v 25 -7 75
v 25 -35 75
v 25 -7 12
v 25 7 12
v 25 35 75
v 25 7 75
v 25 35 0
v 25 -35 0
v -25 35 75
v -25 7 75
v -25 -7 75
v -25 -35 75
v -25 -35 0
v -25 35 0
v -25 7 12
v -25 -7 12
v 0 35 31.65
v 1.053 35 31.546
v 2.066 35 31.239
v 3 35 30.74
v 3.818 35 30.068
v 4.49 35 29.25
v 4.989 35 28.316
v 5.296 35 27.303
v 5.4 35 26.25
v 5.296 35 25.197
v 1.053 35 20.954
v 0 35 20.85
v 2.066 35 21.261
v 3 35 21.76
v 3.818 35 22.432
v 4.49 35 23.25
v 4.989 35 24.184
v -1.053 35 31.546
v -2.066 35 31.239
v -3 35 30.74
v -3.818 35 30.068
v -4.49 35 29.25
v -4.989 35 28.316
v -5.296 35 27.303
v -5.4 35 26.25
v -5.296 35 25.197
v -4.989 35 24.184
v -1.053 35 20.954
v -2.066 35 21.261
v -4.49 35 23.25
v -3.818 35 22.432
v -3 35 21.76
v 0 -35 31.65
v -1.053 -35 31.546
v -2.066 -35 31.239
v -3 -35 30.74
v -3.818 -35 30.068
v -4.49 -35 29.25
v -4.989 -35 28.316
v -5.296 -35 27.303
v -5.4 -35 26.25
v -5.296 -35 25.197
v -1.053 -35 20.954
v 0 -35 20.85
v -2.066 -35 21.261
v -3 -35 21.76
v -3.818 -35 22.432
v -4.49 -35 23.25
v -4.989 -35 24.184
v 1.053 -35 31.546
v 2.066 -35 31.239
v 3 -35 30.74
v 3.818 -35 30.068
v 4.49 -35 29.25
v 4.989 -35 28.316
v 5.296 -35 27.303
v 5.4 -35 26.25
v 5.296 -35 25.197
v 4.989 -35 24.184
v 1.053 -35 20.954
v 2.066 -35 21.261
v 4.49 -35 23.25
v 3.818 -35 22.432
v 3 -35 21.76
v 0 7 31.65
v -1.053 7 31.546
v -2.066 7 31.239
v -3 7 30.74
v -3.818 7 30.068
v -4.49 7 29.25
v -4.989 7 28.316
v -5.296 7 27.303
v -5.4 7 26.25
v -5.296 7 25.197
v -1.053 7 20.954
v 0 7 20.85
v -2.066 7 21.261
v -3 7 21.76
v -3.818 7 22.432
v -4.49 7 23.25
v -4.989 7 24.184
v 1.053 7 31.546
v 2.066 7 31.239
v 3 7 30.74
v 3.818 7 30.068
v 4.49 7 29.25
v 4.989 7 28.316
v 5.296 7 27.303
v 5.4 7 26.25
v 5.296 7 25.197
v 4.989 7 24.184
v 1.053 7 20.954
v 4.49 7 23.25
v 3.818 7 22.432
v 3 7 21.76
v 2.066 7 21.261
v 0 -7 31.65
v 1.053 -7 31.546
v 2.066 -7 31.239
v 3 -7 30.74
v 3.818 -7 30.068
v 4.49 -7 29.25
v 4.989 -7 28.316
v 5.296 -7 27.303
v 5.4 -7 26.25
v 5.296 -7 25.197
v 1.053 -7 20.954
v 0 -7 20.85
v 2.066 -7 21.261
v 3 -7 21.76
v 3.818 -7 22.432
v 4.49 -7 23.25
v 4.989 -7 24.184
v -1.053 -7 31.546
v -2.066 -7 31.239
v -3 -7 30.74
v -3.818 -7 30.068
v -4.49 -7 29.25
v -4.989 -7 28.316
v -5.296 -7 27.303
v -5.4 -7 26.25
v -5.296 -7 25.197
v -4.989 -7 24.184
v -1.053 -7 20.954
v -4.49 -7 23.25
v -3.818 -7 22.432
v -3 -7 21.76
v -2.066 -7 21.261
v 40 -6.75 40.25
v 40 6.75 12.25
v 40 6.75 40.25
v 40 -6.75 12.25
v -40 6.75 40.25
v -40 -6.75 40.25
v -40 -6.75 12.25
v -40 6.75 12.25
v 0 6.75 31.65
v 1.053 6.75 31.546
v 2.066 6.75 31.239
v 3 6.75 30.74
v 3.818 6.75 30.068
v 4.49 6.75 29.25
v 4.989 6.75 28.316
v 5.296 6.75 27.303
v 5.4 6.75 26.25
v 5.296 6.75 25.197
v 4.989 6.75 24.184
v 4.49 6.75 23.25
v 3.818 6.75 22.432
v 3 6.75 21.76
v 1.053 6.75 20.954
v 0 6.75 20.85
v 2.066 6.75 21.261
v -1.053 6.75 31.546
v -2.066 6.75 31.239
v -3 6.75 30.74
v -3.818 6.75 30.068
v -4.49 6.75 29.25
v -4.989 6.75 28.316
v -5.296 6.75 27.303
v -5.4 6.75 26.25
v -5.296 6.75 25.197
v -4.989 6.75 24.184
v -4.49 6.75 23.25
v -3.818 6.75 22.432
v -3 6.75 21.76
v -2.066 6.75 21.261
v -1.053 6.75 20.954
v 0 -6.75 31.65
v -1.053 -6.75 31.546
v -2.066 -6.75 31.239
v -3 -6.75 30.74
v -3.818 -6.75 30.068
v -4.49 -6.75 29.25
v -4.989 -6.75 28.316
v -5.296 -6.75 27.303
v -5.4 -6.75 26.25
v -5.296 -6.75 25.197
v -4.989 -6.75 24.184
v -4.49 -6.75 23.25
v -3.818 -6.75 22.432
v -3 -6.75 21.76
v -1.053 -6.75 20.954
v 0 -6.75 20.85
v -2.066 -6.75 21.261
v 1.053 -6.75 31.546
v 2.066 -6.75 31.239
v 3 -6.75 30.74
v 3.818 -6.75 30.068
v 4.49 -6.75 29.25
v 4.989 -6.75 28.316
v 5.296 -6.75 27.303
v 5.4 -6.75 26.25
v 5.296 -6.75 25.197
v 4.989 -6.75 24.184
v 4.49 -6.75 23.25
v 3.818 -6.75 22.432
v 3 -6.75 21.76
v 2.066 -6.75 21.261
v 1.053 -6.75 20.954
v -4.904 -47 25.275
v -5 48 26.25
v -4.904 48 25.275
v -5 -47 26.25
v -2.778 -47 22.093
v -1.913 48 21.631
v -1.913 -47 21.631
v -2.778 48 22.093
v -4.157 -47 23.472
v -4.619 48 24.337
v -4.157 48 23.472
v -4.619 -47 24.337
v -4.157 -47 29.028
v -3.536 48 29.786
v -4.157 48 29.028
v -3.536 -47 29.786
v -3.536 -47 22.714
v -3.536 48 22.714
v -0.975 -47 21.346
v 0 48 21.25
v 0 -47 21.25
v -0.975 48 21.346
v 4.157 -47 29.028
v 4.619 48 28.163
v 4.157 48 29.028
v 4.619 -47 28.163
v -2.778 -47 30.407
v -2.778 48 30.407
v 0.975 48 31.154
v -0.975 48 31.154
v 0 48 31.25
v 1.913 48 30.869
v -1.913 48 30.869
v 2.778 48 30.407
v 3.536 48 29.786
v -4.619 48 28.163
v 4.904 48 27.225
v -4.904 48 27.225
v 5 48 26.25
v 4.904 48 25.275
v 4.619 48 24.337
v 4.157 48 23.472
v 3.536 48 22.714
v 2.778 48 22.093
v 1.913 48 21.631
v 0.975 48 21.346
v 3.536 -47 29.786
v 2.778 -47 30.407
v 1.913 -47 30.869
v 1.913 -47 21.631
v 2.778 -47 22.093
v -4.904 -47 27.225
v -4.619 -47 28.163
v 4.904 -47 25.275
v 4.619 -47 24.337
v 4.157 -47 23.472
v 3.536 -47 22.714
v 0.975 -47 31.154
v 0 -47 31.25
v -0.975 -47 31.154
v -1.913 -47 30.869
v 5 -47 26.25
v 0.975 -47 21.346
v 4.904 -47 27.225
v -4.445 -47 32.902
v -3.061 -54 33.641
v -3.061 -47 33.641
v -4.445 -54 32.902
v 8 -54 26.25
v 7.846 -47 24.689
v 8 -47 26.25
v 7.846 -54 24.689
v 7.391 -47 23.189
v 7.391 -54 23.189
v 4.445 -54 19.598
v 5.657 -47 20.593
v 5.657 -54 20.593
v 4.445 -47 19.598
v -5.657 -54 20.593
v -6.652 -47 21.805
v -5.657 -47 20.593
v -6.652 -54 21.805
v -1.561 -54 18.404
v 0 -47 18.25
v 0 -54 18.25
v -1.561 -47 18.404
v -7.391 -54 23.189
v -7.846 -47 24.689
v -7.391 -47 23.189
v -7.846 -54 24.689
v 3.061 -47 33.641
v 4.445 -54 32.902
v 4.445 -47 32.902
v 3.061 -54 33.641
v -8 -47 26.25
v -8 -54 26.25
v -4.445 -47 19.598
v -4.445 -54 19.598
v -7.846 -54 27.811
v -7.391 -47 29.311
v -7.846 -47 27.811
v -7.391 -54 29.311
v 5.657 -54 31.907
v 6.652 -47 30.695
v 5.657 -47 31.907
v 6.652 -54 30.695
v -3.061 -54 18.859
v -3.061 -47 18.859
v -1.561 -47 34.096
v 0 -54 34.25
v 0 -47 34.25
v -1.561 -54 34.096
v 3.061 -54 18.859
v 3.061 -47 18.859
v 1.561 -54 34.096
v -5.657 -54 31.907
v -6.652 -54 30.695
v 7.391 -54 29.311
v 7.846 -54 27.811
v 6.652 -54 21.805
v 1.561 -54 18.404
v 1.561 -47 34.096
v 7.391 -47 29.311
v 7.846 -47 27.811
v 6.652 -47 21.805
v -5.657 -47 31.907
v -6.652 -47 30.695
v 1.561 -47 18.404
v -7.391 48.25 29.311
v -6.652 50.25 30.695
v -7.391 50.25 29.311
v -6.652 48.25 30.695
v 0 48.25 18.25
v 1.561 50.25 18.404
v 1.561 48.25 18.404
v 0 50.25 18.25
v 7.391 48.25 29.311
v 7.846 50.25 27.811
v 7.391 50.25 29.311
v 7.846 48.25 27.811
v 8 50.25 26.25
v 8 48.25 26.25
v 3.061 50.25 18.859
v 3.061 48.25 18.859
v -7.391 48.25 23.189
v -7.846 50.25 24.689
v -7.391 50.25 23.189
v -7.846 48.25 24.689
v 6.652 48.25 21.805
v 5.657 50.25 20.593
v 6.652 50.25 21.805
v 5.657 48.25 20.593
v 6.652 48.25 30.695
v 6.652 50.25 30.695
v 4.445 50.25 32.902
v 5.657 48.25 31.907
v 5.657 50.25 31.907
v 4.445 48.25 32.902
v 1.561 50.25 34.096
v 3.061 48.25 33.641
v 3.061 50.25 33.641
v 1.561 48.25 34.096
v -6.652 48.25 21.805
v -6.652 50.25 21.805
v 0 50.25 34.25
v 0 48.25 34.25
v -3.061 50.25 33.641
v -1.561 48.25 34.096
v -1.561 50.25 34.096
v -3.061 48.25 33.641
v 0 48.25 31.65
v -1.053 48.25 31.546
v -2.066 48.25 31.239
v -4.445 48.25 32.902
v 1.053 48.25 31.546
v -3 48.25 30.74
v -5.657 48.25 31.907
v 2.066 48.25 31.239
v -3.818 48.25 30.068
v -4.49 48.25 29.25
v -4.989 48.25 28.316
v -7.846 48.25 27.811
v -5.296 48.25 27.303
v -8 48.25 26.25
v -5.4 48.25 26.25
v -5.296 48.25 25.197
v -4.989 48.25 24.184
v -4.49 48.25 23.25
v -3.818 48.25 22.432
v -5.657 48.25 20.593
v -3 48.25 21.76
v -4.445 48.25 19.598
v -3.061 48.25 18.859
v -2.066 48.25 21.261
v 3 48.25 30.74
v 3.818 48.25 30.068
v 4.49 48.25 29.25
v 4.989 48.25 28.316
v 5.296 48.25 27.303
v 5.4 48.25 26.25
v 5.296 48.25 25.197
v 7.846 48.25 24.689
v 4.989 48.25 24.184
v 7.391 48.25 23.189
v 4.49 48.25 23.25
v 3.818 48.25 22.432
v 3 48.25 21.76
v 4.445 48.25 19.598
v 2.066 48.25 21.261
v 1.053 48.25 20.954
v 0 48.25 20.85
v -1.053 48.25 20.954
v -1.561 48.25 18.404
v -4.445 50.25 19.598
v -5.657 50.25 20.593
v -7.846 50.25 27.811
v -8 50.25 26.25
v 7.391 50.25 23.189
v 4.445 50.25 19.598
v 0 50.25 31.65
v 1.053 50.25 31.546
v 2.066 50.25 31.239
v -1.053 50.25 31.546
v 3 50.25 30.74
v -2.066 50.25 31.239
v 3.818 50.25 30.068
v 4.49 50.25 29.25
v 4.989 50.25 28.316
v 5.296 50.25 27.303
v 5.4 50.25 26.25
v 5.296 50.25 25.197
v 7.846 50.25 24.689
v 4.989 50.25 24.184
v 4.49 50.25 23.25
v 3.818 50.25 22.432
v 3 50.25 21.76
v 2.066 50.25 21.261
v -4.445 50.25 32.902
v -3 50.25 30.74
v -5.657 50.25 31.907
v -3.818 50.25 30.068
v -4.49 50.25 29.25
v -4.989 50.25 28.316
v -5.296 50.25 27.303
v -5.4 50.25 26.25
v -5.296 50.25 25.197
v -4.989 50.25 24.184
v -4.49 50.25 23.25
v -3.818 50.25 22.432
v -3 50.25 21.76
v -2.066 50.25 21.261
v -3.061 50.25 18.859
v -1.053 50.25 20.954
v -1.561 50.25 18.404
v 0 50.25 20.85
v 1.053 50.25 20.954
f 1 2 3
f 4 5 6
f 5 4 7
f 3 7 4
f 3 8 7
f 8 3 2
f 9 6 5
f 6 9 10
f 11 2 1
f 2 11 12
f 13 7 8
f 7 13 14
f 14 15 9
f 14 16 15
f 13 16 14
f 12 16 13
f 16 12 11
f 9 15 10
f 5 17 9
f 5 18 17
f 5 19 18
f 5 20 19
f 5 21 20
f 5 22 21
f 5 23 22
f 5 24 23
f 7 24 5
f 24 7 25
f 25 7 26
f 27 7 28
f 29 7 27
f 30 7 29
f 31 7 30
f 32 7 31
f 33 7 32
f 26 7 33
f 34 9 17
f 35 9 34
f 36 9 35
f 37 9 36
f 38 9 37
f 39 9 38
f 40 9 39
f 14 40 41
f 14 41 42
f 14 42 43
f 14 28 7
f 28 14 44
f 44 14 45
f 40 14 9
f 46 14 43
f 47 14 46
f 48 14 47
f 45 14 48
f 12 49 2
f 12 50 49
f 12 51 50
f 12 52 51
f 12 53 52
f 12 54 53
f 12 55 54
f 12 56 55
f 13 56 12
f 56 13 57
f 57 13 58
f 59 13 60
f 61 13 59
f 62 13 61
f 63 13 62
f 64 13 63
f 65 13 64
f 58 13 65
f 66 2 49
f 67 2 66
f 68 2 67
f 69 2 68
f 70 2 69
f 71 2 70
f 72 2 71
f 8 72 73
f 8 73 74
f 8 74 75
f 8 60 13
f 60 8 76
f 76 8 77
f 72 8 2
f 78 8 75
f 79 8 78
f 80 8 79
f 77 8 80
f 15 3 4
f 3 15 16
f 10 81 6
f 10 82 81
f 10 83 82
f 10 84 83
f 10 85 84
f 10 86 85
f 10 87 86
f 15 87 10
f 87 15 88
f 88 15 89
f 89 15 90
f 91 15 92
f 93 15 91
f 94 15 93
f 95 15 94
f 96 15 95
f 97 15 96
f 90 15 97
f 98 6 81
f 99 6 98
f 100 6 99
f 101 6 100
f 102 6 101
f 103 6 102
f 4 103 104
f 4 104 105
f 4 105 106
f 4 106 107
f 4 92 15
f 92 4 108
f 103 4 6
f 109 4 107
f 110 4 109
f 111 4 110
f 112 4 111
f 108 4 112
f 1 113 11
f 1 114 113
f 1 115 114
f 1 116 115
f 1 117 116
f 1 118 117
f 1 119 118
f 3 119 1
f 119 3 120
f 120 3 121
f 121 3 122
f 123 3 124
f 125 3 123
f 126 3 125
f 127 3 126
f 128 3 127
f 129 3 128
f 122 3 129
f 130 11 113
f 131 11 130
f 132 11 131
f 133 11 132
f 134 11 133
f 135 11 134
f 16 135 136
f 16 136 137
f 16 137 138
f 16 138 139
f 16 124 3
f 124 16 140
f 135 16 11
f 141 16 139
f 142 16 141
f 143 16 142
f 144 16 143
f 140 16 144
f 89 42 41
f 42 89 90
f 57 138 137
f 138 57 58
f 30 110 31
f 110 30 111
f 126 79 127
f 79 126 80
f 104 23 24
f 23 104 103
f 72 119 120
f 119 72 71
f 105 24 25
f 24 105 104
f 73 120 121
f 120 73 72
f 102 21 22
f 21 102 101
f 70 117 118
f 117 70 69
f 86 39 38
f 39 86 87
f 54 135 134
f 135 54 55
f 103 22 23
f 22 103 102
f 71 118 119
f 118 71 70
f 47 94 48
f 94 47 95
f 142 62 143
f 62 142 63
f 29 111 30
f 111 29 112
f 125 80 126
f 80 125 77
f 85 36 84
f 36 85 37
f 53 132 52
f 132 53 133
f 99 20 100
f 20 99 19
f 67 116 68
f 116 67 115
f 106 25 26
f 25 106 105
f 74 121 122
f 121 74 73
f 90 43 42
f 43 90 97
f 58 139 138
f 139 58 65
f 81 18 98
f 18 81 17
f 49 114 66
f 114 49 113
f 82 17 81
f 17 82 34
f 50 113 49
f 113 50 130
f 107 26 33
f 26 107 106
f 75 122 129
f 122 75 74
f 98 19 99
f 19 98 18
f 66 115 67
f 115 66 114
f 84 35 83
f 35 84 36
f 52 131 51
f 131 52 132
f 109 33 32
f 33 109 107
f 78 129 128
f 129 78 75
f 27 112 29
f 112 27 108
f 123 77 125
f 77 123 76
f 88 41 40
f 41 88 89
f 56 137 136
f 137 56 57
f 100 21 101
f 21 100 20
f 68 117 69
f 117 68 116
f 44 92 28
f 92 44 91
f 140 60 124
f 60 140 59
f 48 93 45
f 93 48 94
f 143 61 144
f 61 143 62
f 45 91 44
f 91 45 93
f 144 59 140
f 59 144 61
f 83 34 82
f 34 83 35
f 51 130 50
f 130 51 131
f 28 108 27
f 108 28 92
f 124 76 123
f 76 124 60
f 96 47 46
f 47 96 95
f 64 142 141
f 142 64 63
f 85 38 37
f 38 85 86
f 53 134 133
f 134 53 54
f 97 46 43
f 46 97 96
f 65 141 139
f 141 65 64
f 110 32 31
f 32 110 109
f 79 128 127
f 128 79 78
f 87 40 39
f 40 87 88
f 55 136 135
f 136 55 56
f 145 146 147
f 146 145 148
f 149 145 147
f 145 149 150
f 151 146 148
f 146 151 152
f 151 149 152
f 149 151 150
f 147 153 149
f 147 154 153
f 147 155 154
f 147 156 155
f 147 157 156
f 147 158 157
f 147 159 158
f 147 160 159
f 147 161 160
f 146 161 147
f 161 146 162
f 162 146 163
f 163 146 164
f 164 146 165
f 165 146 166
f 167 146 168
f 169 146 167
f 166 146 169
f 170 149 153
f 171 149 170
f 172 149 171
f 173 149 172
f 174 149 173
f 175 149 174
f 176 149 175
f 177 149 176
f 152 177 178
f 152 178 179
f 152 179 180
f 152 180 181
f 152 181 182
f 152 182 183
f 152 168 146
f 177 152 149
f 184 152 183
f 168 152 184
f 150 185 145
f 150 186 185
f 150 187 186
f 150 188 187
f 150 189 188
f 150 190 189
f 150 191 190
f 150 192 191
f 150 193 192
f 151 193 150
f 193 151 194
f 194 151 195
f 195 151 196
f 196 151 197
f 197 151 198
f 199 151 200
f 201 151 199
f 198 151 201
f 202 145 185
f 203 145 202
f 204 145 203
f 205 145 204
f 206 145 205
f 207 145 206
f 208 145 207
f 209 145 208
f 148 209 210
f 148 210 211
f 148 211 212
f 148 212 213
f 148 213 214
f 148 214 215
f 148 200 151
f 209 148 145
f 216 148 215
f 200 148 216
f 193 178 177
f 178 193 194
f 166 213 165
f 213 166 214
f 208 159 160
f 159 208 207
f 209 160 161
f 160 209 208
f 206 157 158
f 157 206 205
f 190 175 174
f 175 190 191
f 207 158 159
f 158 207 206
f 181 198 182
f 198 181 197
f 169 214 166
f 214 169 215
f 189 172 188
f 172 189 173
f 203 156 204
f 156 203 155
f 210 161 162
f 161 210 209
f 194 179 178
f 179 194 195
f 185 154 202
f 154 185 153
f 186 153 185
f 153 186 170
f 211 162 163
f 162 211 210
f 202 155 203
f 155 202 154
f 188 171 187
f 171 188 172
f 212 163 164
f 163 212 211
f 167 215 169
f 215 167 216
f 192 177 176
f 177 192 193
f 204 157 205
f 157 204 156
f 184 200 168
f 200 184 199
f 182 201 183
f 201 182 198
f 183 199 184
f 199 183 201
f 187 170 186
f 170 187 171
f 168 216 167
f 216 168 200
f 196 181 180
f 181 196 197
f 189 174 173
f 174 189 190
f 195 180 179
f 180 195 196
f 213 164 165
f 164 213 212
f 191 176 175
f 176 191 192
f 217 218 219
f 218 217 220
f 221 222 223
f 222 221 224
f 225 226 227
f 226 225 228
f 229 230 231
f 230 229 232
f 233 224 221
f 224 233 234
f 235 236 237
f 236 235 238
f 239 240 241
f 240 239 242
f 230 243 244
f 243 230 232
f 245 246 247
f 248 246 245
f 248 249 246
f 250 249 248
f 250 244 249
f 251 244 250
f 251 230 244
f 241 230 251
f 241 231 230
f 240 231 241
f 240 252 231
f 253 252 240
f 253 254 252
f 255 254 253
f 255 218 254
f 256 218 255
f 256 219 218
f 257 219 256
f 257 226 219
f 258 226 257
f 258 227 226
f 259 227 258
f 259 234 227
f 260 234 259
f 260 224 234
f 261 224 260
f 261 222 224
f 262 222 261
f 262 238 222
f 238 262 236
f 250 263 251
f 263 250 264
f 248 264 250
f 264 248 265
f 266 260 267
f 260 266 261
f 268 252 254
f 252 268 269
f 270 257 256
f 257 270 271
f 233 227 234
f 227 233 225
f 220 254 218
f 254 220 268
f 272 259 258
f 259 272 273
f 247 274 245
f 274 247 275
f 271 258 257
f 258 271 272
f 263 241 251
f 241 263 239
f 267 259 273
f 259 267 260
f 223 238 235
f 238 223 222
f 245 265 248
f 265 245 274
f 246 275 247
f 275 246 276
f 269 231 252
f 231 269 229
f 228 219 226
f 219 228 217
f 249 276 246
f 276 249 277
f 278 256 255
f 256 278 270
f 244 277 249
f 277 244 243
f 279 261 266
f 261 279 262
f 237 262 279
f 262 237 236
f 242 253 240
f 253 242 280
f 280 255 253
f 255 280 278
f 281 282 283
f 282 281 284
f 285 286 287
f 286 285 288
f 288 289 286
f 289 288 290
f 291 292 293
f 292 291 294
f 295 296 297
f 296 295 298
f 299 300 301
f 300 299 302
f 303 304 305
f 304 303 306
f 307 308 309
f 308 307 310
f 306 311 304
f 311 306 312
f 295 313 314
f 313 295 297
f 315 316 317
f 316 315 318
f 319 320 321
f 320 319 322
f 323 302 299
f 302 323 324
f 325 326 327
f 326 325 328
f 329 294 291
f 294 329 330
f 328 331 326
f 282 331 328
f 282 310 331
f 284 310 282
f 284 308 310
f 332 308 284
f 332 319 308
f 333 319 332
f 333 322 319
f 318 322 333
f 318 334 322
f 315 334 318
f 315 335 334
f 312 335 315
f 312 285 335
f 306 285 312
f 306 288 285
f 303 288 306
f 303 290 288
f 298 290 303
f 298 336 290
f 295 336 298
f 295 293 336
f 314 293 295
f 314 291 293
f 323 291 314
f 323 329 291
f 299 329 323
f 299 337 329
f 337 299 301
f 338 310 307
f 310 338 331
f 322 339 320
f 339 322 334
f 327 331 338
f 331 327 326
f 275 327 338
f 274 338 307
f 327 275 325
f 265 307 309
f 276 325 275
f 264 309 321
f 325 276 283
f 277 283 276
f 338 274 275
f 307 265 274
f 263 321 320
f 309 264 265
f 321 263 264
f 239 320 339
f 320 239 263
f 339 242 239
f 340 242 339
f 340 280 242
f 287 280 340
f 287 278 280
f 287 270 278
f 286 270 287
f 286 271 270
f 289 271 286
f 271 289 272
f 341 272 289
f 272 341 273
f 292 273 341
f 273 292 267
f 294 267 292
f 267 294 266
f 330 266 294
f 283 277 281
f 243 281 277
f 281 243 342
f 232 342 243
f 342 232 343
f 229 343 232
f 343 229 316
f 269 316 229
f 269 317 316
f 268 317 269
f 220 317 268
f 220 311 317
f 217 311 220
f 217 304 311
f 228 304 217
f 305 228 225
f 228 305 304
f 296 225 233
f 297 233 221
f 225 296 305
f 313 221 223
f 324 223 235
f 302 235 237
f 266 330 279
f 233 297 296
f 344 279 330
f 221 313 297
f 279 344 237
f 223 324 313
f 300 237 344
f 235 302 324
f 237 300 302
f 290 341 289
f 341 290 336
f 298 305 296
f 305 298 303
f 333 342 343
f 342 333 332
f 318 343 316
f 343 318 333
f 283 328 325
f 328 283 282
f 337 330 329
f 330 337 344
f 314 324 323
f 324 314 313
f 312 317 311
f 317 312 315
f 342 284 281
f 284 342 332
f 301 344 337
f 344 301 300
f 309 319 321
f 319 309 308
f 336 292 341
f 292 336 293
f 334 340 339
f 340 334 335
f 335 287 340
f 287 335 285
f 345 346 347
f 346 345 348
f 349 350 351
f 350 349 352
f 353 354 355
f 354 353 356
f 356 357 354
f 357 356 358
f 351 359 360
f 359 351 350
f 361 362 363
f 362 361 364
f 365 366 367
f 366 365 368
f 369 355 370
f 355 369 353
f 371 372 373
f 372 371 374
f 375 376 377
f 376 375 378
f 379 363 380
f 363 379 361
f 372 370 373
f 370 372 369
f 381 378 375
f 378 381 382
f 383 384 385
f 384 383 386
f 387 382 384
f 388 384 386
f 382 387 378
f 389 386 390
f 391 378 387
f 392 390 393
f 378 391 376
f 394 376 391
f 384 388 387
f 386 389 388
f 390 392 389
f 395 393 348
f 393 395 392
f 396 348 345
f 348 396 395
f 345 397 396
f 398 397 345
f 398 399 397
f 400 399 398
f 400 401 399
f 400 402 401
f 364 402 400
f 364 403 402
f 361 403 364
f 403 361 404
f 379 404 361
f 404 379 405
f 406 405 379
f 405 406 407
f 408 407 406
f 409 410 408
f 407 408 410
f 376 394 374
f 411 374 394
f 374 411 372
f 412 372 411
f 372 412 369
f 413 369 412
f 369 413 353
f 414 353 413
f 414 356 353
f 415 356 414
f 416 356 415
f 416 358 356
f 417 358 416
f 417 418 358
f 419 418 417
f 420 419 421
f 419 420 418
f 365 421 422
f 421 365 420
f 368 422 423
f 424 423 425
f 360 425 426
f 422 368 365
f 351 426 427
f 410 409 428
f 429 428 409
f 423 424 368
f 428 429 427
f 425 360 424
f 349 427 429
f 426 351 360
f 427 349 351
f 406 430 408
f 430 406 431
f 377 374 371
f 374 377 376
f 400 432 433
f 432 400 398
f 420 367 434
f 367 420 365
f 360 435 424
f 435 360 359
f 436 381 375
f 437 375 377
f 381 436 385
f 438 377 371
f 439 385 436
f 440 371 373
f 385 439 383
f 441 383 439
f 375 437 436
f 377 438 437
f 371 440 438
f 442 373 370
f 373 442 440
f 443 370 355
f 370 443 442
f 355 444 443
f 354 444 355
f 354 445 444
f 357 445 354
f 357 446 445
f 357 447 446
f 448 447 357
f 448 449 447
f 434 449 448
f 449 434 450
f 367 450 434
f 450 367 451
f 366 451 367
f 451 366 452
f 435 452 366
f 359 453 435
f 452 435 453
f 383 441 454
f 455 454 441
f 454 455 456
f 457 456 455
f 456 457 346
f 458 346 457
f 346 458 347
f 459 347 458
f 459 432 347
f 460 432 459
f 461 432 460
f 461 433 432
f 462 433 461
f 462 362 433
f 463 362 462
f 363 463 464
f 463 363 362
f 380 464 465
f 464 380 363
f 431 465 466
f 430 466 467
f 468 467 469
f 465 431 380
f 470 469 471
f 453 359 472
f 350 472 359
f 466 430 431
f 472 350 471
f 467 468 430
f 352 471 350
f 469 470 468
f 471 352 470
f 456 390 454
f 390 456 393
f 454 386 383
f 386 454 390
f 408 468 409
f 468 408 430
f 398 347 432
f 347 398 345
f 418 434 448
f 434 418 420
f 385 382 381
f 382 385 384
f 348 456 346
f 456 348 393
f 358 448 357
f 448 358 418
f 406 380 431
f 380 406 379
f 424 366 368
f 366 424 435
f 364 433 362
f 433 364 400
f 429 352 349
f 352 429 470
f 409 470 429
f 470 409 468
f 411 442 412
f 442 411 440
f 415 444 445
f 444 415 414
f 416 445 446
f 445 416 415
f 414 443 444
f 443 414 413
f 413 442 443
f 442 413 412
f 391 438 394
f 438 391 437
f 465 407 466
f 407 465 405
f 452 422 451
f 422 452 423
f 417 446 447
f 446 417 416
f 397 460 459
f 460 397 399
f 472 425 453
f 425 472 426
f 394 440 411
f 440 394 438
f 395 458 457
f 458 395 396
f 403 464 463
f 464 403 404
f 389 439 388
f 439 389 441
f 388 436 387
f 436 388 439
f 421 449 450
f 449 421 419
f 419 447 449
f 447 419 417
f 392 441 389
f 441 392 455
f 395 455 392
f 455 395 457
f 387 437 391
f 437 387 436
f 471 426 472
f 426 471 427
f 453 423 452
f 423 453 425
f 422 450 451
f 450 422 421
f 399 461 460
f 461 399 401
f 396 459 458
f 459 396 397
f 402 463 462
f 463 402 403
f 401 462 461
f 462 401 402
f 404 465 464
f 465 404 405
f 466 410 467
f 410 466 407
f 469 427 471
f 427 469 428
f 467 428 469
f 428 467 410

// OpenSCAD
$fn = 32;

// ------------------------------------------------------------------------
// Clevis joint: 50 mm clevis, pin d10
// Every part is its own module, assembly() places them once.
// ------------------------------------------------------------------------

// --- part 1 ---
module clevis() {
  difference() {
    translate([-25, -35, 0]) cube([50, 70, 75]);
    translate([-26, -7, 12]) cube([52, 14, 64]);
    translate([0, 0, 26.25]) rotate([90, 0, 0]) cylinder(h = 72, d = 10.8, center = true);
  }
}

// --- part 2 ---
module eye() {
  difference() {
    translate([-40, -6.75, 0]) cube([80, 13.5, 28]);
    translate([0, 0, 14]) rotate([90, 0, 0]) cylinder(h = 15.5, d = 10.8, center = true);
  }
}

// --- part 3 ---
module pin() {
  rotate([0, 90, 0]) cylinder(h = 96, d = 10, center = true);
  translate([-54, 0, 0]) rotate([0, 90, 0]) cylinder(h = 7, d = 16);
}

// --- part 4 ---
module retainer() {
  difference() {
      translate([0, 0, 0]) cylinder(h = 2, d = 16);
      translate([0, 0, -1]) cylinder(h = 4, d = 10.8);
    }
}

// --- assembly ---
module assembly() {
  translate([0, 0, 0]) rotate([0, 0, 0]) clevis();
  translate([0, 0, 12.25]) rotate([0, 0, 0]) eye();
  translate([0, 0, 26.25]) rotate([0, 0, 90]) pin();
  translate([0, 50.25, 26.25]) rotate([90, 0, 0]) retainer();
}

assembly();
